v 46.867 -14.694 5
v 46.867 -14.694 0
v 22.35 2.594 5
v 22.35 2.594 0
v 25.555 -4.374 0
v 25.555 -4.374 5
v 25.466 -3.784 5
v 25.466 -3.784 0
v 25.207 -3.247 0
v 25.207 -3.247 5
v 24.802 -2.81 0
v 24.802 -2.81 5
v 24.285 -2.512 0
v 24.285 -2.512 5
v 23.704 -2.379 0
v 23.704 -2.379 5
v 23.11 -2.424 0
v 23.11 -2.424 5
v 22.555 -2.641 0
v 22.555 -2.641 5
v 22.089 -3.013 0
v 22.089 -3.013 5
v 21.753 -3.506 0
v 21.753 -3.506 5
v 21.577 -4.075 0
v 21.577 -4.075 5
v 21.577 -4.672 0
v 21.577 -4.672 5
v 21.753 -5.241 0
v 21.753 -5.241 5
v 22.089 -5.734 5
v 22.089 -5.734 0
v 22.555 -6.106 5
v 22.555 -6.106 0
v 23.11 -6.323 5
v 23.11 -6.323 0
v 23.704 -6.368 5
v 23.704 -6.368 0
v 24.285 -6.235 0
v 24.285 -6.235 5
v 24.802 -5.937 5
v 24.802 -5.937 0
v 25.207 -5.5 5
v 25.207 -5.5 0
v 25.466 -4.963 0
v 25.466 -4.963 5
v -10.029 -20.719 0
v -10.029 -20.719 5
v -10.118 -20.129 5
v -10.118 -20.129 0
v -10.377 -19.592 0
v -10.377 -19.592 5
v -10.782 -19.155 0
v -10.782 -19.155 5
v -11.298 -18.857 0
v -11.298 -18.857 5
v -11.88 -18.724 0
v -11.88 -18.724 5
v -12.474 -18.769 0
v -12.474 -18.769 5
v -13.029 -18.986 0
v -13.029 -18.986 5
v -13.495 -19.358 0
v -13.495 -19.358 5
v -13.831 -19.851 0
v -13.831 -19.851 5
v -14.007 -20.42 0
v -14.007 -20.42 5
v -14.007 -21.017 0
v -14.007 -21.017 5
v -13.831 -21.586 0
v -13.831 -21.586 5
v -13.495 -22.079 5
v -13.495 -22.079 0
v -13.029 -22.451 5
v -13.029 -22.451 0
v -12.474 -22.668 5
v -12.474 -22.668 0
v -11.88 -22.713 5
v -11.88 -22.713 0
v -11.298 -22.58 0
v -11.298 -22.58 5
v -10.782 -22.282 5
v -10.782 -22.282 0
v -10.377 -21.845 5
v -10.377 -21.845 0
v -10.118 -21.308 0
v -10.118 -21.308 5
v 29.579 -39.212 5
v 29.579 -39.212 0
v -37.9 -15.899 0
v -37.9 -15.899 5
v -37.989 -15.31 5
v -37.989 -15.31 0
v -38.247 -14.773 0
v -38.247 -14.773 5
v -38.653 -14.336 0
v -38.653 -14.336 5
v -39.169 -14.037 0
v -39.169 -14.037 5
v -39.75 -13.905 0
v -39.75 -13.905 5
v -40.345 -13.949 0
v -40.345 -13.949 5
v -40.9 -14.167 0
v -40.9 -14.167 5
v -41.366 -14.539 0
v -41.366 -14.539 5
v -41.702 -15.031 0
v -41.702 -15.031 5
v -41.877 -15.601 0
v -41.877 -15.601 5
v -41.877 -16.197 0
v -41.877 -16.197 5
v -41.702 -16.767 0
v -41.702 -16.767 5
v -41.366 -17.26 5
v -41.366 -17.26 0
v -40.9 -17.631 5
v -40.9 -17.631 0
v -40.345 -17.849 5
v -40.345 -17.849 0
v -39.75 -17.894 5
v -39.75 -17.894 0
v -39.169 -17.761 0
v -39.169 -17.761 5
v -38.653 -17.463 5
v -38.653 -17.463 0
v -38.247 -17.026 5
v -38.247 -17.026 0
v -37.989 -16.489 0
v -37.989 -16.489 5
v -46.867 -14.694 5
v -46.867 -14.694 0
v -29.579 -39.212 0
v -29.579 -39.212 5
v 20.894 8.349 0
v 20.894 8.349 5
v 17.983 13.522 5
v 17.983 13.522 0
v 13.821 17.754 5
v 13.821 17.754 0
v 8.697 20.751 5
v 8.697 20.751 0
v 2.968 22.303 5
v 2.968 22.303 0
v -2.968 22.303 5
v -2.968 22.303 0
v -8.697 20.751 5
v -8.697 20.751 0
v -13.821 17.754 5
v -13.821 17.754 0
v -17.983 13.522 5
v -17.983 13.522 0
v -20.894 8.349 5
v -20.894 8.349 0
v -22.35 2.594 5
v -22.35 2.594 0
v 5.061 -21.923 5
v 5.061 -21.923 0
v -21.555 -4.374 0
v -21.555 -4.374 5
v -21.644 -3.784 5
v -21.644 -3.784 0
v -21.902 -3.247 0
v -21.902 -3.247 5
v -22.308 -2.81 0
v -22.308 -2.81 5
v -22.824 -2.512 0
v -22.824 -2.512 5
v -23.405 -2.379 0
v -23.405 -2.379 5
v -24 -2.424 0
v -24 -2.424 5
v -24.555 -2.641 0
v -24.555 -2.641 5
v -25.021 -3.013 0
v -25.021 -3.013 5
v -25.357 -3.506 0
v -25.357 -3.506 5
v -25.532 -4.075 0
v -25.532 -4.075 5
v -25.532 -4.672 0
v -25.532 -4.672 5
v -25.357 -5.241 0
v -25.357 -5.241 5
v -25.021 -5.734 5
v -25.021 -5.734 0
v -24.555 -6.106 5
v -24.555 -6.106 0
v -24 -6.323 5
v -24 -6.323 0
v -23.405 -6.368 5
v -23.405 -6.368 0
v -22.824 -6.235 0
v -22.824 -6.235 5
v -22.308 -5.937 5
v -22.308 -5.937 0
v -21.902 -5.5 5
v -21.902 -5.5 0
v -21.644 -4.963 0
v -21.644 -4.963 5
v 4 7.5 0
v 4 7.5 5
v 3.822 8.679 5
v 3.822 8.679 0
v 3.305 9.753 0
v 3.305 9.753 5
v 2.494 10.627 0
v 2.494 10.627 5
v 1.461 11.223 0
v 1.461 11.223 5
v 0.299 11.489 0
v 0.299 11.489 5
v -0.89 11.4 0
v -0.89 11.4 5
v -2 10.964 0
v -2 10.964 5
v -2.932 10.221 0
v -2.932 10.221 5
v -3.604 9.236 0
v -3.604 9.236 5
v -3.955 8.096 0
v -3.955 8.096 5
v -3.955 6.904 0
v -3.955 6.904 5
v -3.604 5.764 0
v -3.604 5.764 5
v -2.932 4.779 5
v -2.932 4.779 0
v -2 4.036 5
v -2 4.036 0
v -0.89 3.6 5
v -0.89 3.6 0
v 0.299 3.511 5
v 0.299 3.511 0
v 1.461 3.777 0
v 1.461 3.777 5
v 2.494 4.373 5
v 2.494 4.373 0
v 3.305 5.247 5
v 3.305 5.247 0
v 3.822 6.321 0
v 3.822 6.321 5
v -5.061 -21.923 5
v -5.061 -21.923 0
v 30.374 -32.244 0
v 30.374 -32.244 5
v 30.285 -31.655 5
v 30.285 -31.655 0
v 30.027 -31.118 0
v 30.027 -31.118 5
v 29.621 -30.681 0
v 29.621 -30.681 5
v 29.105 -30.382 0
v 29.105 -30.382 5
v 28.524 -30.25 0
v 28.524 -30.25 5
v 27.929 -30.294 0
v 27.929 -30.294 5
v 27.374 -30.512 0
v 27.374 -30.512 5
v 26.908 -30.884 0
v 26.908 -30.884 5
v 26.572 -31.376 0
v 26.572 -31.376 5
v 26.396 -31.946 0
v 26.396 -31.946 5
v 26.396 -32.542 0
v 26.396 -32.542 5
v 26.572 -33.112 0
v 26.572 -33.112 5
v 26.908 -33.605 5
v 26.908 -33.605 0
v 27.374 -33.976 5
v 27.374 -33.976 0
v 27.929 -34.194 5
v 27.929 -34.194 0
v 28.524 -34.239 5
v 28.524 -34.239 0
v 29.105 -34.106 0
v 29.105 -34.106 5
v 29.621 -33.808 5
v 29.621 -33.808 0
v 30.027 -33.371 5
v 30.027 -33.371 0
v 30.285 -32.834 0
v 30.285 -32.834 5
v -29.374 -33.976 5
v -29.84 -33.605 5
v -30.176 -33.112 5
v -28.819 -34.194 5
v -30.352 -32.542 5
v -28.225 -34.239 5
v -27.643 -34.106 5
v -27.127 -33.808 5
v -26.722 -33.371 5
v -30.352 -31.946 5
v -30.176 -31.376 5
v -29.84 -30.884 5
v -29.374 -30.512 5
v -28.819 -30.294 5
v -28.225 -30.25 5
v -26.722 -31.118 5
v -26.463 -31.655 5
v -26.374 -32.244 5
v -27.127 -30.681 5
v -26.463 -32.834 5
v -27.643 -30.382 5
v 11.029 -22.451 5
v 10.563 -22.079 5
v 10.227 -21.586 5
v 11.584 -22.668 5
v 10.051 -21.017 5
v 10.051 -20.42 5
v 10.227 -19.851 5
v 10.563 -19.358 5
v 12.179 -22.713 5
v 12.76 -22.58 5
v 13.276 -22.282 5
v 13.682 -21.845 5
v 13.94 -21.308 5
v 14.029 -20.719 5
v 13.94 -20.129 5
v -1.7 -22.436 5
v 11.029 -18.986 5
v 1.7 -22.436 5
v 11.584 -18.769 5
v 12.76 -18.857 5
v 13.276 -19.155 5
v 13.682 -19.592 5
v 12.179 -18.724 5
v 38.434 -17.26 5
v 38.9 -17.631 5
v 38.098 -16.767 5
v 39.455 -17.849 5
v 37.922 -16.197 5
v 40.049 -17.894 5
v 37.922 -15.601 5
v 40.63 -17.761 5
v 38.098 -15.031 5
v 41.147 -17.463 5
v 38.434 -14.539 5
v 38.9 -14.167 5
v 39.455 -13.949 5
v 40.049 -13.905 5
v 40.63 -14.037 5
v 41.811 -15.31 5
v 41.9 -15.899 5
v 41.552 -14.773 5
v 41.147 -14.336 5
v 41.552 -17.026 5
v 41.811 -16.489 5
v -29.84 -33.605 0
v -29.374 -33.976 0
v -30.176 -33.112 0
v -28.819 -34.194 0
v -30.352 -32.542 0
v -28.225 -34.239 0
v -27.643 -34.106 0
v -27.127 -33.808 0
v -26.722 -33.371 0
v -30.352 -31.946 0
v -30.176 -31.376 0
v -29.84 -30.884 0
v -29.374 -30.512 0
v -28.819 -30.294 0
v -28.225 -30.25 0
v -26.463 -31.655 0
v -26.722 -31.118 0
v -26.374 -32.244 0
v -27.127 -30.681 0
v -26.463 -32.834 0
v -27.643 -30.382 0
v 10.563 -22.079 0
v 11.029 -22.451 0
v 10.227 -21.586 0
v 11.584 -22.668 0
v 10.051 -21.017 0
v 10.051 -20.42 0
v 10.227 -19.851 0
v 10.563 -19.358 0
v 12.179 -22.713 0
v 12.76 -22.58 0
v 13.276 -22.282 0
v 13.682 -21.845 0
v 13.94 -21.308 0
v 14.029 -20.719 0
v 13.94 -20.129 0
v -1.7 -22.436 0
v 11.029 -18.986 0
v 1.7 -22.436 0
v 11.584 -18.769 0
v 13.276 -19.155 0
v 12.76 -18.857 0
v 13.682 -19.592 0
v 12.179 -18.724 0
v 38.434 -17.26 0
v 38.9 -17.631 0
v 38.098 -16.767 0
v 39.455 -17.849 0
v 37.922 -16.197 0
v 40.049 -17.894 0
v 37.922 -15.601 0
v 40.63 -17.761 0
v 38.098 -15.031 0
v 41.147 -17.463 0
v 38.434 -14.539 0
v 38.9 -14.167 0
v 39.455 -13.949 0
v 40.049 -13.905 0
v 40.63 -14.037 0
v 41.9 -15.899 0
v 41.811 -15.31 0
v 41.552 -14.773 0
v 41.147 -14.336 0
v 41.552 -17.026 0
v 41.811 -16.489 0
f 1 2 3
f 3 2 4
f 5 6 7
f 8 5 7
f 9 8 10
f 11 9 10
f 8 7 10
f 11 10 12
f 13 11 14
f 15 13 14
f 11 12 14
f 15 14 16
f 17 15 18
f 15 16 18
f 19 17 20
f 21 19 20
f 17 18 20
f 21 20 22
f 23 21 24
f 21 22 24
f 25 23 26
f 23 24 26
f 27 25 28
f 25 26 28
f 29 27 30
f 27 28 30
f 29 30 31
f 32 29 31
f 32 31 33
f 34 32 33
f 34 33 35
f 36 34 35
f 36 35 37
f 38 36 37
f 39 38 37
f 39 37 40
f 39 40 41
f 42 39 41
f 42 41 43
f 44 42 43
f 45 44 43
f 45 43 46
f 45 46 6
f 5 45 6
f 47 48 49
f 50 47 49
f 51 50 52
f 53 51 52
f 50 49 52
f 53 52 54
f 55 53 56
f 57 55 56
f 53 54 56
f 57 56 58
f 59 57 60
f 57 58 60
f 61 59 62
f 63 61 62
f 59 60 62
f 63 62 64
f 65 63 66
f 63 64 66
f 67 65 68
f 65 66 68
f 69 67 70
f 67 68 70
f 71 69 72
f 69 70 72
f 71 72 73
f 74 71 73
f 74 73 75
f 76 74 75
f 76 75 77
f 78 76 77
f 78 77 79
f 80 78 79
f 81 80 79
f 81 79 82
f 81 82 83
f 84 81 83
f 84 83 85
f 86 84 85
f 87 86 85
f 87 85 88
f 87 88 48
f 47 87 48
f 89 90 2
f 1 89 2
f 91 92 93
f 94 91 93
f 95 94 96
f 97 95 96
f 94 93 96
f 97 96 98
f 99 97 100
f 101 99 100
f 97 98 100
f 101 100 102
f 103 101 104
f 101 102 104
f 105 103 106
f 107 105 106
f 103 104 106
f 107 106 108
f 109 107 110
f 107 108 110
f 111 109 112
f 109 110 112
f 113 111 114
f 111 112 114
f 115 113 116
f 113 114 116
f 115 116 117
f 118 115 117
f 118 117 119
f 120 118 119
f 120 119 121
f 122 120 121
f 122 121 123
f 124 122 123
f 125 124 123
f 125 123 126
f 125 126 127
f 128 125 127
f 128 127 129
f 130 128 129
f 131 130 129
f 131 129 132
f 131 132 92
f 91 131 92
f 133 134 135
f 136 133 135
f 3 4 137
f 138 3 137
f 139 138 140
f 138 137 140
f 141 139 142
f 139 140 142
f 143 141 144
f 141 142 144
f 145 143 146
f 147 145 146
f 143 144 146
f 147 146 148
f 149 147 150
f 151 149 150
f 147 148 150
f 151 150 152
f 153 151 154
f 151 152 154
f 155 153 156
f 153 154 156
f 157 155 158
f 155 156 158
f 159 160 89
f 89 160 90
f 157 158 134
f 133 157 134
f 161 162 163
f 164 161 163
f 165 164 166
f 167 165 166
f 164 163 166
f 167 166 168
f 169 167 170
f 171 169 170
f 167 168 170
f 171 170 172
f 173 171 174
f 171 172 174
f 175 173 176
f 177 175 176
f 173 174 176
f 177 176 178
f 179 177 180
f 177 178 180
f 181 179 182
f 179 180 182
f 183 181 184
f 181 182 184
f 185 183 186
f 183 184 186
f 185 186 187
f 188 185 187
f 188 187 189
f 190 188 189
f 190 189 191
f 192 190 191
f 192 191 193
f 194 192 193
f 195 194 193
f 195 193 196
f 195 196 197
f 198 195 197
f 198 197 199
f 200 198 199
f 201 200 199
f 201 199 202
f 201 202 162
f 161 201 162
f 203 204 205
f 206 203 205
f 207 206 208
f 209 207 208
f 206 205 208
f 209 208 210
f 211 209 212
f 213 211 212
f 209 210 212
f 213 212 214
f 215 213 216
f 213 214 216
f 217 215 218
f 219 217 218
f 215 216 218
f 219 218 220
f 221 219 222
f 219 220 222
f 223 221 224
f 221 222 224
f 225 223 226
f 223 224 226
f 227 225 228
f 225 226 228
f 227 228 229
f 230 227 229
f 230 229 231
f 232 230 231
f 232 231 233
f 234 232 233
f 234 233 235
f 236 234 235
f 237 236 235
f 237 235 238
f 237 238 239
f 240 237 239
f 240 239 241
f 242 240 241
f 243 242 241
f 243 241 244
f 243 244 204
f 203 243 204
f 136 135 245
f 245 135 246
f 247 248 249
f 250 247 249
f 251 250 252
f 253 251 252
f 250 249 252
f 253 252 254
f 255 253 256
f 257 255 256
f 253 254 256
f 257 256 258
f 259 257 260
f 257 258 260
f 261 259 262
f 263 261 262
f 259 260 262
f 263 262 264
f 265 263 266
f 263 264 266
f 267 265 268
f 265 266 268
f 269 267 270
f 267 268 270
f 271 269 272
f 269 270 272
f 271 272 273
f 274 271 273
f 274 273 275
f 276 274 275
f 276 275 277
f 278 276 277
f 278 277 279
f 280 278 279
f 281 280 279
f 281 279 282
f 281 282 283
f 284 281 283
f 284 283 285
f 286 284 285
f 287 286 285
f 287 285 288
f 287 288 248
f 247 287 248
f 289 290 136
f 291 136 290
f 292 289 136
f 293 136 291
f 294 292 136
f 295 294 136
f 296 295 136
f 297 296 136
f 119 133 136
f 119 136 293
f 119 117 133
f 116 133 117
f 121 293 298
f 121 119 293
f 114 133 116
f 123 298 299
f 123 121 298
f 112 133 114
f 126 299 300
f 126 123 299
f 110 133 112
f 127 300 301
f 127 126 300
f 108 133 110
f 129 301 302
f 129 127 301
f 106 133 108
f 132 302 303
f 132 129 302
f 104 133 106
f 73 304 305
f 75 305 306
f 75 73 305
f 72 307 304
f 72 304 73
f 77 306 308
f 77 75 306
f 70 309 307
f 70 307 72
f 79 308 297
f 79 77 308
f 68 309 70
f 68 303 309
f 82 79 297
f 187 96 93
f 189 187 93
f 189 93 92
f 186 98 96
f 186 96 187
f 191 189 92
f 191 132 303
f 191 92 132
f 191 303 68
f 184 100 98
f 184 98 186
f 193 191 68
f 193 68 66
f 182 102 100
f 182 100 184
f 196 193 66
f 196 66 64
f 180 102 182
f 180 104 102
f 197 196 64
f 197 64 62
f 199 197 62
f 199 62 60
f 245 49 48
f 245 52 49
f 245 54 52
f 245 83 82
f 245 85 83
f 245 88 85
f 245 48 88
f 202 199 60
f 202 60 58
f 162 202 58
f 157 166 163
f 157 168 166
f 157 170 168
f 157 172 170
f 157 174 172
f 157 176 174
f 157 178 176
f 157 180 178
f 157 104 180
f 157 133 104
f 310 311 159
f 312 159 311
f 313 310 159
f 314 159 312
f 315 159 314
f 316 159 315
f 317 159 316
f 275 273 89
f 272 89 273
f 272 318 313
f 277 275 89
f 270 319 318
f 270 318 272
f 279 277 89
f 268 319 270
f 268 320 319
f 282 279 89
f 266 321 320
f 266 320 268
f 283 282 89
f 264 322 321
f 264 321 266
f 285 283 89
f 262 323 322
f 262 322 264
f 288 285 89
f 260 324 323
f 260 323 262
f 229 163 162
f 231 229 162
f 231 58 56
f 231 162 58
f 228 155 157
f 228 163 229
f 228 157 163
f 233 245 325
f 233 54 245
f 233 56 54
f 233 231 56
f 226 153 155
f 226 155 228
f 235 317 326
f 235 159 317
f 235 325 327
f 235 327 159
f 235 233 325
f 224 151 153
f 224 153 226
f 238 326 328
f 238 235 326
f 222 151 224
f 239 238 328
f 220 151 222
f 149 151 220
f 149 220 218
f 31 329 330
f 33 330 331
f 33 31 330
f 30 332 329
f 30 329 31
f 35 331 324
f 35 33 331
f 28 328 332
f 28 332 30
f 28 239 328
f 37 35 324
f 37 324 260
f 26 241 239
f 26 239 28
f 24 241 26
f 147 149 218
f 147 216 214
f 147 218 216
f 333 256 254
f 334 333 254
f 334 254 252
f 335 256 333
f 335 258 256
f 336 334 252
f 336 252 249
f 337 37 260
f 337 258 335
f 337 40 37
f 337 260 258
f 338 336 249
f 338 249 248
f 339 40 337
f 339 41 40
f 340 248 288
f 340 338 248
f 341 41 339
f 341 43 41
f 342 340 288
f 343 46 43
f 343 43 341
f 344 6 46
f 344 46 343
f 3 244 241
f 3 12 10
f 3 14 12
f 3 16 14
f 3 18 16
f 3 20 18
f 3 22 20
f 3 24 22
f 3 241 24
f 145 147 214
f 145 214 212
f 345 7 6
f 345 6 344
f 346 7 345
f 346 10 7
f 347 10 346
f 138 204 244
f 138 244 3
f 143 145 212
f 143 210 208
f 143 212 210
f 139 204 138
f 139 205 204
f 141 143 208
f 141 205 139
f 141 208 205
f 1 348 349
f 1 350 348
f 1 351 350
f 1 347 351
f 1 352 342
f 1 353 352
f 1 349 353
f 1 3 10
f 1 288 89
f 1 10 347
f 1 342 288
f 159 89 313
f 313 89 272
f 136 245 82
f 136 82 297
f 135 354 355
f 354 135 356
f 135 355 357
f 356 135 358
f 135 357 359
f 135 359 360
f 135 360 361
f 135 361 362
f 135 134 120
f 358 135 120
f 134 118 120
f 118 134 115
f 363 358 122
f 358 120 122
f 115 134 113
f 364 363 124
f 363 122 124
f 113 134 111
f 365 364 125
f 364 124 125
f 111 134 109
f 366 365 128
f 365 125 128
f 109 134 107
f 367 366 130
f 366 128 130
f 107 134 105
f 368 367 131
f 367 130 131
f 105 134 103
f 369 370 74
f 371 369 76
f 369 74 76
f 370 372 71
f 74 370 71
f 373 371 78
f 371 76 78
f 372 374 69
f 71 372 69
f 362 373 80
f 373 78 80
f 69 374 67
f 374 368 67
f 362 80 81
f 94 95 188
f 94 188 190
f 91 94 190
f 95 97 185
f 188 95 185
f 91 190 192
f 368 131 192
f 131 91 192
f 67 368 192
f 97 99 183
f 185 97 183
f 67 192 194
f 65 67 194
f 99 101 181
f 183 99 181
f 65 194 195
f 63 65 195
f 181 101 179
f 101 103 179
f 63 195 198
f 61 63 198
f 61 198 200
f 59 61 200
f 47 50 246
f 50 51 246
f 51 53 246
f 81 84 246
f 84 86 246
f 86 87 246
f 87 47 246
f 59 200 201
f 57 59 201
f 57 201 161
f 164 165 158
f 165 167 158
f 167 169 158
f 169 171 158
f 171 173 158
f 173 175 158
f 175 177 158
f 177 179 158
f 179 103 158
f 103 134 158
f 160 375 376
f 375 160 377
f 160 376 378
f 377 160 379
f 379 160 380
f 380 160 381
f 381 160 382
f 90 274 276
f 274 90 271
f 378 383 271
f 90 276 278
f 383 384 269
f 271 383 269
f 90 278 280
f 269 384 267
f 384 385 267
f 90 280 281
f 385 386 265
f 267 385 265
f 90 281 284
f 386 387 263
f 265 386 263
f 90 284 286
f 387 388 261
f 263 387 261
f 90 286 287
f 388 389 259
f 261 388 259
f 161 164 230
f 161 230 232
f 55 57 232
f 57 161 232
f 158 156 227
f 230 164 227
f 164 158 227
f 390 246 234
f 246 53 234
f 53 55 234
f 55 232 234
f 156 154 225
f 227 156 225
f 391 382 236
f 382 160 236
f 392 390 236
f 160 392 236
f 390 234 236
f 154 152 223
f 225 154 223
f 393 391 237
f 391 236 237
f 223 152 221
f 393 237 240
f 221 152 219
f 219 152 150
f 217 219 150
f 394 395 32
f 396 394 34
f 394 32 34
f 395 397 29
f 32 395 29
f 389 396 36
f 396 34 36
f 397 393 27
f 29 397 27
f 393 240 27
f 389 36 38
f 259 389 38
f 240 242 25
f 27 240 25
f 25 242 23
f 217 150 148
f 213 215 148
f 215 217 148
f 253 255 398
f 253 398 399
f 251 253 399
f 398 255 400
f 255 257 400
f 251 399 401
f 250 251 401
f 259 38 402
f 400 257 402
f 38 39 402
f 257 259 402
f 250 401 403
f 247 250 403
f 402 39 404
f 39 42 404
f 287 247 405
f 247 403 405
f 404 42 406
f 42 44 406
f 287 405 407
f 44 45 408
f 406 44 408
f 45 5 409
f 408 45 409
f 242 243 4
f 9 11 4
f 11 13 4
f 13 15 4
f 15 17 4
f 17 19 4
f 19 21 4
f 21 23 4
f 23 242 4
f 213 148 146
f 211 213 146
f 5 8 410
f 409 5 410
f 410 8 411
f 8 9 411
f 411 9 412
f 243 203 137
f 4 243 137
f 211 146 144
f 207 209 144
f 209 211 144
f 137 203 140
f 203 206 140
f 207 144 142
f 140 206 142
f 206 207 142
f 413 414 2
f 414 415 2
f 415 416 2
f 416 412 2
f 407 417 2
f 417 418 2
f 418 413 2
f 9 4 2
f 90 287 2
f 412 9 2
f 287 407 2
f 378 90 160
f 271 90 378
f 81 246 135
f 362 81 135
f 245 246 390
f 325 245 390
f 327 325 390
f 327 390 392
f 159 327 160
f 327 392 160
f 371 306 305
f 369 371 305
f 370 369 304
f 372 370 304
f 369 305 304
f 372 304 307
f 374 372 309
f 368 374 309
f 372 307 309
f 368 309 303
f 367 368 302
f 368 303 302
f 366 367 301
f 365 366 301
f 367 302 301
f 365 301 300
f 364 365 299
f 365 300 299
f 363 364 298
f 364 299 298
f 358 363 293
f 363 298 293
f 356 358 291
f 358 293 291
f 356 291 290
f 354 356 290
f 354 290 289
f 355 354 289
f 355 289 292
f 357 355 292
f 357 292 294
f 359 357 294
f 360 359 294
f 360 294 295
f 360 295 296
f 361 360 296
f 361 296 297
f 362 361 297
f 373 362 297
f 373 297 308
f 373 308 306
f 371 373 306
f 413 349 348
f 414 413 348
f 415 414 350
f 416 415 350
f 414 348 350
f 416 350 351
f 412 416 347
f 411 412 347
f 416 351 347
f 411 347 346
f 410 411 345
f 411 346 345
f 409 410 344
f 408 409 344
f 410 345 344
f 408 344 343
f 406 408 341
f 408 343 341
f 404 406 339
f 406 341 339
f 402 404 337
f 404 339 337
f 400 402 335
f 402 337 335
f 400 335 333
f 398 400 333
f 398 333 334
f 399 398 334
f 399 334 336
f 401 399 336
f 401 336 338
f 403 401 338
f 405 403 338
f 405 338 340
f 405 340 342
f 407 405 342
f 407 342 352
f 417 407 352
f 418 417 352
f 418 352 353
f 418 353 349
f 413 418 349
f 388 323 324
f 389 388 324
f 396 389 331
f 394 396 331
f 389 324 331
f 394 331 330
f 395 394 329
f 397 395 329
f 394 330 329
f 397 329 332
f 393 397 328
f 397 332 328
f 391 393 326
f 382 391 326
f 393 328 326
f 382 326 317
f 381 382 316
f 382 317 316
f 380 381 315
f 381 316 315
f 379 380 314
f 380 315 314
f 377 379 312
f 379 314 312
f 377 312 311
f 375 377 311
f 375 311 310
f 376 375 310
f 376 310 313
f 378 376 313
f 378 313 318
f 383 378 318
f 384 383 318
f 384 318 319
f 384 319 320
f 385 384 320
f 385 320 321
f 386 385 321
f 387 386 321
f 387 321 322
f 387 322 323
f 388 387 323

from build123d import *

# Parameters (mm, degrees)
BOSS_EXTRUDE1_DEPTH = 5
SKETCH4_R           = 2
CUT_EXTRUDE1_DEPTH  = 10
SKETCH5_R           = 4
CUT_EXTRUDE2_DEPTH  = 10


with BuildPart() as part:
    # Sketch2 → Boss-Extrude1 (new body)
    with BuildSketch(Plane.XY):
        with BuildLine():
            Line((5.061398723, -21.923326458), (29.57885851, -39.211882372))
            Line((29.57885851, -39.211882372), (46.867414424, -14.694422585))
            Line((46.867414424, -14.694422585), (22.349954637, 2.594133329))
            ThreePointArc((22.349954637, 2.594133329), (0, 22.5), (-22.349954637, 2.594133329))
            Line((-22.349954637, 2.594133329), (-46.867414424, -14.694422585))
            Line((-46.867414424, -14.694422585), (-29.57885851, -39.211882372))
            Line((-29.57885851, -39.211882372), (-5.061398723, -21.923326458))
            ThreePointArc((-5.061398723, -21.923326458), (0, -22.5), (5.061398723, -21.923326458))
        make_face()
    extrude(amount=BOSS_EXTRUDE1_DEPTH)

    # Sketch4 → Cut-Extrude1 (cut)
    with BuildSketch(Plane.XY.offset(5)):
        with Locations((-39.89974514, -15.899239897)):
            Circle(SKETCH4_R)
        with Locations((-23.554771949, -4.373535954)):
            Circle(SKETCH4_R)
        with Locations((-12.029068006, -20.718509146)):
            Circle(SKETCH4_R)
        with Locations((-28.374041198, -32.244213088)):
            Circle(SKETCH4_R)
        with Locations((23.554771949, -4.373535954)):
            Circle(SKETCH4_R)
        with Locations((12.029068006, -20.718509146)):
            Circle(SKETCH4_R)
        with Locations((39.89974514, -15.899239897)):
            Circle(SKETCH4_R)
        with Locations((28.374041198, -32.244213088)):
            Circle(SKETCH4_R)
    extrude(amount=-CUT_EXTRUDE1_DEPTH, mode=Mode.SUBTRACT)

    # Sketch5 → Cut-Extrude2 (cut)
    with BuildSketch(Plane.XY.offset(5)):
        with Locations((0, 7.5)):
            Circle(SKETCH5_R)
    extrude(amount=-CUT_EXTRUDE2_DEPTH, mode=Mode.SUBTRACT)


solid = part.part
